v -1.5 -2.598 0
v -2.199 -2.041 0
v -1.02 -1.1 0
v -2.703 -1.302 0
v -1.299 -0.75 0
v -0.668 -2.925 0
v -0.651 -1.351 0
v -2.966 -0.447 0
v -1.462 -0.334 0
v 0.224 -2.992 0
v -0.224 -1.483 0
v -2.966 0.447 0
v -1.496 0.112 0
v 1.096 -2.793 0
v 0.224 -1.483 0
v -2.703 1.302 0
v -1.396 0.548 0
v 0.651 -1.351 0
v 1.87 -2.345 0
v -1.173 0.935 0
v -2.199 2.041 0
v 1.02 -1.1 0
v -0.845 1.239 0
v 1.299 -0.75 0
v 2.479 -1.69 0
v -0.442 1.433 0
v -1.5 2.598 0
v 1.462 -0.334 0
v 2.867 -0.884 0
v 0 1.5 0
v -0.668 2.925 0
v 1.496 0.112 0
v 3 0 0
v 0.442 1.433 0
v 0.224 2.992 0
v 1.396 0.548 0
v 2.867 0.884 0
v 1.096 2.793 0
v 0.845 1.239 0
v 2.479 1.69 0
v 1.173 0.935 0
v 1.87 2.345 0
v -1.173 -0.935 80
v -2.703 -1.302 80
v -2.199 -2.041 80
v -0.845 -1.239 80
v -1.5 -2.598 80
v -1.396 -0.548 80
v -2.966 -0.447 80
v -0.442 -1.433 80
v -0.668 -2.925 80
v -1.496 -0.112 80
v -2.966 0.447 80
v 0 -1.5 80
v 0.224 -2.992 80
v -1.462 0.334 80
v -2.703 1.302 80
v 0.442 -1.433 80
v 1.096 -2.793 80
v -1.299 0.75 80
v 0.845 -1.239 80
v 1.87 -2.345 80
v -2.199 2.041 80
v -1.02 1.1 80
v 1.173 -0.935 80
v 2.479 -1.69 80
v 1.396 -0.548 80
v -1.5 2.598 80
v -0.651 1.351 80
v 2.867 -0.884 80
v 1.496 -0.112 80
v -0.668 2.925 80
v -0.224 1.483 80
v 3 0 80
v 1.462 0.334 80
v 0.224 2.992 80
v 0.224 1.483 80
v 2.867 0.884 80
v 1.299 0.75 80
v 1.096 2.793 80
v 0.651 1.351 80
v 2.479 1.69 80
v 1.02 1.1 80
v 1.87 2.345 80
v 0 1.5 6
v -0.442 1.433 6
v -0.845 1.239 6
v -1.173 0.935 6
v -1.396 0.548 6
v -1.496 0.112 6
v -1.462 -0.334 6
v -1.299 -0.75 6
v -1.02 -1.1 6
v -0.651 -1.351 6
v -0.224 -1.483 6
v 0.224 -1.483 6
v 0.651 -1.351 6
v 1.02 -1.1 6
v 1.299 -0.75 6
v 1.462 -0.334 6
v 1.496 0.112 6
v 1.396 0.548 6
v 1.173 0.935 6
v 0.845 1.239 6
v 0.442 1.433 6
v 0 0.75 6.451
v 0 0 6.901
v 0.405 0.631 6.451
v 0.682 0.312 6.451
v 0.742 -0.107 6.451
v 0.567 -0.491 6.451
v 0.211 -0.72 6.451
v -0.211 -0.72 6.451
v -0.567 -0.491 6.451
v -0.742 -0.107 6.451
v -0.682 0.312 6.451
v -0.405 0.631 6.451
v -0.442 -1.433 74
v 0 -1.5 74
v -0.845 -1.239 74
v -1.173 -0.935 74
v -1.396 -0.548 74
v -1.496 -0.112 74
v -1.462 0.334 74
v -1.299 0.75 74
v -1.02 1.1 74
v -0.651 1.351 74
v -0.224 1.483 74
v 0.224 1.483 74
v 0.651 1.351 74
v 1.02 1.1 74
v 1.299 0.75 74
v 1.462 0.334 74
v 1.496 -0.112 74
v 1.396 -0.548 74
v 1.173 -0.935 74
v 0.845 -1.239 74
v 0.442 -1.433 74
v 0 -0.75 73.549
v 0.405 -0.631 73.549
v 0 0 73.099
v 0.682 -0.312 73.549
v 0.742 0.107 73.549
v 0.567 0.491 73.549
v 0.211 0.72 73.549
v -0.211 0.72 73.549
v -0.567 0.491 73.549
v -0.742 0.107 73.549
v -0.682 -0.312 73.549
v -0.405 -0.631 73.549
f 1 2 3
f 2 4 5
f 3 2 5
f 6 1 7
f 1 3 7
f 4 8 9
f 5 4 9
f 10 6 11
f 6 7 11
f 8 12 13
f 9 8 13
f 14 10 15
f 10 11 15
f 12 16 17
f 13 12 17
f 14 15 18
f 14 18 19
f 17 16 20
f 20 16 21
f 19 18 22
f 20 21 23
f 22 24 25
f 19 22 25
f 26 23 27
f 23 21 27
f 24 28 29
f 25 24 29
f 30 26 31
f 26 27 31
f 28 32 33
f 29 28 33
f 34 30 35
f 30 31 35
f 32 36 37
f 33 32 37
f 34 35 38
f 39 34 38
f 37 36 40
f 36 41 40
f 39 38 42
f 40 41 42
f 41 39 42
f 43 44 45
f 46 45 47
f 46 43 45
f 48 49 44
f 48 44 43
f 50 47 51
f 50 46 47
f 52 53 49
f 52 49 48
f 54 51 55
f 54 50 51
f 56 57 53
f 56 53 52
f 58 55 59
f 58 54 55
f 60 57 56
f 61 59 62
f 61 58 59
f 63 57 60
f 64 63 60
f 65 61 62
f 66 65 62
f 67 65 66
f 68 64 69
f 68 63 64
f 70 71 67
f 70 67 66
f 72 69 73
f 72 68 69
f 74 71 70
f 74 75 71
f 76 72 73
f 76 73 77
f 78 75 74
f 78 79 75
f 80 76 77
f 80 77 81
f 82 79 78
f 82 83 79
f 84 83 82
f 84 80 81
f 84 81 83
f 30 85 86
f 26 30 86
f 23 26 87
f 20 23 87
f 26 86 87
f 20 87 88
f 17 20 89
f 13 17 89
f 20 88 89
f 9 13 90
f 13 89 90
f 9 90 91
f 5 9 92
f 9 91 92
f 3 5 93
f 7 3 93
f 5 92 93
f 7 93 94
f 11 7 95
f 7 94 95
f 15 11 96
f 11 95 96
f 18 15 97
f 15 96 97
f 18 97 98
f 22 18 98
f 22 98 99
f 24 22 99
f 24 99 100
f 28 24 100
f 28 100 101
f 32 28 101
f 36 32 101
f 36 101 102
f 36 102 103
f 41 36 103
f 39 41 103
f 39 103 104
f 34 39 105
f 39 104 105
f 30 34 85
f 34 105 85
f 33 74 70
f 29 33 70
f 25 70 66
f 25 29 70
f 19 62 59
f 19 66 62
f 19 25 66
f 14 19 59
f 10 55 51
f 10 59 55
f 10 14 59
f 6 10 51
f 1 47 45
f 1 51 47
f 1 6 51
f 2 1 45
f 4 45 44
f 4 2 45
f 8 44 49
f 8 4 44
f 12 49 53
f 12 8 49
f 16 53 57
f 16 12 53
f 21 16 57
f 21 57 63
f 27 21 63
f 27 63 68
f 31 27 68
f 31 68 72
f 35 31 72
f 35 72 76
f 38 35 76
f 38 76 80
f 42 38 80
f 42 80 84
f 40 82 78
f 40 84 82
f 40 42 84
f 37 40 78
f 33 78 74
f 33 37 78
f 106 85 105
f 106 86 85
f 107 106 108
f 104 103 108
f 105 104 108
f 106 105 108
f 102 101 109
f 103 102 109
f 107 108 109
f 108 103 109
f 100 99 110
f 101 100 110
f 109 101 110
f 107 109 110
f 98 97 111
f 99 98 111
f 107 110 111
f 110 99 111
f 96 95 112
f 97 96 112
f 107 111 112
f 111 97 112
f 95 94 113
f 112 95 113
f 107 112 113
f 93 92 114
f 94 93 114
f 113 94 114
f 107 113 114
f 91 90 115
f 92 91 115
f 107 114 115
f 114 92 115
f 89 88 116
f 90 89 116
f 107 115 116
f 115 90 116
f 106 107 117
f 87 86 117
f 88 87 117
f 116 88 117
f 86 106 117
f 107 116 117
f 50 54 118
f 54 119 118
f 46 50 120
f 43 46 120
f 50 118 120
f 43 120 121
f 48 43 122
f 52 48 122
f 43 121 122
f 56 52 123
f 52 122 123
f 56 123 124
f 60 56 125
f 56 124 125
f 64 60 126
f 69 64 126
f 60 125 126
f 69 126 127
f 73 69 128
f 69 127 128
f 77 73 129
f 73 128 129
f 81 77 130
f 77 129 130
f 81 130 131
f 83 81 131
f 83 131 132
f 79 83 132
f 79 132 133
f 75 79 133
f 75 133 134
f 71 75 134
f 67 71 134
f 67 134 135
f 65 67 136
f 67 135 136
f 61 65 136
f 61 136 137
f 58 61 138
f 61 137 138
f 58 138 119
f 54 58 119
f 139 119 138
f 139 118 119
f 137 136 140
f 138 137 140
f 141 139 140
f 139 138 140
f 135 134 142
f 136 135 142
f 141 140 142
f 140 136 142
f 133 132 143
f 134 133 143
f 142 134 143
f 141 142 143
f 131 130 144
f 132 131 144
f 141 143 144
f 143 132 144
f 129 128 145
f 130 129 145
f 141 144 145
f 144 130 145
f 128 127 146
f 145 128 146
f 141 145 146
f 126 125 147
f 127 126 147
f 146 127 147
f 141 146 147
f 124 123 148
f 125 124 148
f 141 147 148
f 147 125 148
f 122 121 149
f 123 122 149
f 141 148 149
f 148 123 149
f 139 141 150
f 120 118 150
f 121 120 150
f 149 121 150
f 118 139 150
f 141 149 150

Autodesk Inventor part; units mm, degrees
ref_plane "YZ Plane" through (0, 0, 0) normal (1, 0, 0) x (0, 1, 0)
ref_plane "XZ Plane" through (0, 0, 0) normal (0, 1, 0) x (-1, 0, 0)
ref_plane "XY Plane" through (0, 0, 0) normal (0, 0, 1) x (1, 0, 0)
sketch "スケッチ1" plane through (0, 0, 0) normal (0, 0, 1) x (1, 0, 0)
  circle A0 centre (0, 0) radius 3
  circle A1 centre (0, 0) radius 1.5005
  dimension "d0" = 6
  dimension "d1" = 3.001
extrude "押し出し1" add sketch "スケッチ1" along normal blind 80
sketch "スケッチ2" plane through (0, 0, 80) normal (0, 0, 1) x (1, 0, 0)
  circle A0 centre (0, 0) radius 1.5005 projected
  circle A1 centre (0, 0) radius 1.5
  dimension "d4" = 3
extrude "押し出し2" add sketch "スケッチ2" against normal blind 80
hole "穴1" at (0, 0, 80) direction (0, 0, -1) diameter 3 depth 6 tip angle 118
hole "穴2" at (0, 0, 0) direction (0, 0, 1) diameter 3 depth 6 tip angle 118
properties part number "スペーサーm3-80　簡易筒型" material "アルミニウム 2014-T4"
